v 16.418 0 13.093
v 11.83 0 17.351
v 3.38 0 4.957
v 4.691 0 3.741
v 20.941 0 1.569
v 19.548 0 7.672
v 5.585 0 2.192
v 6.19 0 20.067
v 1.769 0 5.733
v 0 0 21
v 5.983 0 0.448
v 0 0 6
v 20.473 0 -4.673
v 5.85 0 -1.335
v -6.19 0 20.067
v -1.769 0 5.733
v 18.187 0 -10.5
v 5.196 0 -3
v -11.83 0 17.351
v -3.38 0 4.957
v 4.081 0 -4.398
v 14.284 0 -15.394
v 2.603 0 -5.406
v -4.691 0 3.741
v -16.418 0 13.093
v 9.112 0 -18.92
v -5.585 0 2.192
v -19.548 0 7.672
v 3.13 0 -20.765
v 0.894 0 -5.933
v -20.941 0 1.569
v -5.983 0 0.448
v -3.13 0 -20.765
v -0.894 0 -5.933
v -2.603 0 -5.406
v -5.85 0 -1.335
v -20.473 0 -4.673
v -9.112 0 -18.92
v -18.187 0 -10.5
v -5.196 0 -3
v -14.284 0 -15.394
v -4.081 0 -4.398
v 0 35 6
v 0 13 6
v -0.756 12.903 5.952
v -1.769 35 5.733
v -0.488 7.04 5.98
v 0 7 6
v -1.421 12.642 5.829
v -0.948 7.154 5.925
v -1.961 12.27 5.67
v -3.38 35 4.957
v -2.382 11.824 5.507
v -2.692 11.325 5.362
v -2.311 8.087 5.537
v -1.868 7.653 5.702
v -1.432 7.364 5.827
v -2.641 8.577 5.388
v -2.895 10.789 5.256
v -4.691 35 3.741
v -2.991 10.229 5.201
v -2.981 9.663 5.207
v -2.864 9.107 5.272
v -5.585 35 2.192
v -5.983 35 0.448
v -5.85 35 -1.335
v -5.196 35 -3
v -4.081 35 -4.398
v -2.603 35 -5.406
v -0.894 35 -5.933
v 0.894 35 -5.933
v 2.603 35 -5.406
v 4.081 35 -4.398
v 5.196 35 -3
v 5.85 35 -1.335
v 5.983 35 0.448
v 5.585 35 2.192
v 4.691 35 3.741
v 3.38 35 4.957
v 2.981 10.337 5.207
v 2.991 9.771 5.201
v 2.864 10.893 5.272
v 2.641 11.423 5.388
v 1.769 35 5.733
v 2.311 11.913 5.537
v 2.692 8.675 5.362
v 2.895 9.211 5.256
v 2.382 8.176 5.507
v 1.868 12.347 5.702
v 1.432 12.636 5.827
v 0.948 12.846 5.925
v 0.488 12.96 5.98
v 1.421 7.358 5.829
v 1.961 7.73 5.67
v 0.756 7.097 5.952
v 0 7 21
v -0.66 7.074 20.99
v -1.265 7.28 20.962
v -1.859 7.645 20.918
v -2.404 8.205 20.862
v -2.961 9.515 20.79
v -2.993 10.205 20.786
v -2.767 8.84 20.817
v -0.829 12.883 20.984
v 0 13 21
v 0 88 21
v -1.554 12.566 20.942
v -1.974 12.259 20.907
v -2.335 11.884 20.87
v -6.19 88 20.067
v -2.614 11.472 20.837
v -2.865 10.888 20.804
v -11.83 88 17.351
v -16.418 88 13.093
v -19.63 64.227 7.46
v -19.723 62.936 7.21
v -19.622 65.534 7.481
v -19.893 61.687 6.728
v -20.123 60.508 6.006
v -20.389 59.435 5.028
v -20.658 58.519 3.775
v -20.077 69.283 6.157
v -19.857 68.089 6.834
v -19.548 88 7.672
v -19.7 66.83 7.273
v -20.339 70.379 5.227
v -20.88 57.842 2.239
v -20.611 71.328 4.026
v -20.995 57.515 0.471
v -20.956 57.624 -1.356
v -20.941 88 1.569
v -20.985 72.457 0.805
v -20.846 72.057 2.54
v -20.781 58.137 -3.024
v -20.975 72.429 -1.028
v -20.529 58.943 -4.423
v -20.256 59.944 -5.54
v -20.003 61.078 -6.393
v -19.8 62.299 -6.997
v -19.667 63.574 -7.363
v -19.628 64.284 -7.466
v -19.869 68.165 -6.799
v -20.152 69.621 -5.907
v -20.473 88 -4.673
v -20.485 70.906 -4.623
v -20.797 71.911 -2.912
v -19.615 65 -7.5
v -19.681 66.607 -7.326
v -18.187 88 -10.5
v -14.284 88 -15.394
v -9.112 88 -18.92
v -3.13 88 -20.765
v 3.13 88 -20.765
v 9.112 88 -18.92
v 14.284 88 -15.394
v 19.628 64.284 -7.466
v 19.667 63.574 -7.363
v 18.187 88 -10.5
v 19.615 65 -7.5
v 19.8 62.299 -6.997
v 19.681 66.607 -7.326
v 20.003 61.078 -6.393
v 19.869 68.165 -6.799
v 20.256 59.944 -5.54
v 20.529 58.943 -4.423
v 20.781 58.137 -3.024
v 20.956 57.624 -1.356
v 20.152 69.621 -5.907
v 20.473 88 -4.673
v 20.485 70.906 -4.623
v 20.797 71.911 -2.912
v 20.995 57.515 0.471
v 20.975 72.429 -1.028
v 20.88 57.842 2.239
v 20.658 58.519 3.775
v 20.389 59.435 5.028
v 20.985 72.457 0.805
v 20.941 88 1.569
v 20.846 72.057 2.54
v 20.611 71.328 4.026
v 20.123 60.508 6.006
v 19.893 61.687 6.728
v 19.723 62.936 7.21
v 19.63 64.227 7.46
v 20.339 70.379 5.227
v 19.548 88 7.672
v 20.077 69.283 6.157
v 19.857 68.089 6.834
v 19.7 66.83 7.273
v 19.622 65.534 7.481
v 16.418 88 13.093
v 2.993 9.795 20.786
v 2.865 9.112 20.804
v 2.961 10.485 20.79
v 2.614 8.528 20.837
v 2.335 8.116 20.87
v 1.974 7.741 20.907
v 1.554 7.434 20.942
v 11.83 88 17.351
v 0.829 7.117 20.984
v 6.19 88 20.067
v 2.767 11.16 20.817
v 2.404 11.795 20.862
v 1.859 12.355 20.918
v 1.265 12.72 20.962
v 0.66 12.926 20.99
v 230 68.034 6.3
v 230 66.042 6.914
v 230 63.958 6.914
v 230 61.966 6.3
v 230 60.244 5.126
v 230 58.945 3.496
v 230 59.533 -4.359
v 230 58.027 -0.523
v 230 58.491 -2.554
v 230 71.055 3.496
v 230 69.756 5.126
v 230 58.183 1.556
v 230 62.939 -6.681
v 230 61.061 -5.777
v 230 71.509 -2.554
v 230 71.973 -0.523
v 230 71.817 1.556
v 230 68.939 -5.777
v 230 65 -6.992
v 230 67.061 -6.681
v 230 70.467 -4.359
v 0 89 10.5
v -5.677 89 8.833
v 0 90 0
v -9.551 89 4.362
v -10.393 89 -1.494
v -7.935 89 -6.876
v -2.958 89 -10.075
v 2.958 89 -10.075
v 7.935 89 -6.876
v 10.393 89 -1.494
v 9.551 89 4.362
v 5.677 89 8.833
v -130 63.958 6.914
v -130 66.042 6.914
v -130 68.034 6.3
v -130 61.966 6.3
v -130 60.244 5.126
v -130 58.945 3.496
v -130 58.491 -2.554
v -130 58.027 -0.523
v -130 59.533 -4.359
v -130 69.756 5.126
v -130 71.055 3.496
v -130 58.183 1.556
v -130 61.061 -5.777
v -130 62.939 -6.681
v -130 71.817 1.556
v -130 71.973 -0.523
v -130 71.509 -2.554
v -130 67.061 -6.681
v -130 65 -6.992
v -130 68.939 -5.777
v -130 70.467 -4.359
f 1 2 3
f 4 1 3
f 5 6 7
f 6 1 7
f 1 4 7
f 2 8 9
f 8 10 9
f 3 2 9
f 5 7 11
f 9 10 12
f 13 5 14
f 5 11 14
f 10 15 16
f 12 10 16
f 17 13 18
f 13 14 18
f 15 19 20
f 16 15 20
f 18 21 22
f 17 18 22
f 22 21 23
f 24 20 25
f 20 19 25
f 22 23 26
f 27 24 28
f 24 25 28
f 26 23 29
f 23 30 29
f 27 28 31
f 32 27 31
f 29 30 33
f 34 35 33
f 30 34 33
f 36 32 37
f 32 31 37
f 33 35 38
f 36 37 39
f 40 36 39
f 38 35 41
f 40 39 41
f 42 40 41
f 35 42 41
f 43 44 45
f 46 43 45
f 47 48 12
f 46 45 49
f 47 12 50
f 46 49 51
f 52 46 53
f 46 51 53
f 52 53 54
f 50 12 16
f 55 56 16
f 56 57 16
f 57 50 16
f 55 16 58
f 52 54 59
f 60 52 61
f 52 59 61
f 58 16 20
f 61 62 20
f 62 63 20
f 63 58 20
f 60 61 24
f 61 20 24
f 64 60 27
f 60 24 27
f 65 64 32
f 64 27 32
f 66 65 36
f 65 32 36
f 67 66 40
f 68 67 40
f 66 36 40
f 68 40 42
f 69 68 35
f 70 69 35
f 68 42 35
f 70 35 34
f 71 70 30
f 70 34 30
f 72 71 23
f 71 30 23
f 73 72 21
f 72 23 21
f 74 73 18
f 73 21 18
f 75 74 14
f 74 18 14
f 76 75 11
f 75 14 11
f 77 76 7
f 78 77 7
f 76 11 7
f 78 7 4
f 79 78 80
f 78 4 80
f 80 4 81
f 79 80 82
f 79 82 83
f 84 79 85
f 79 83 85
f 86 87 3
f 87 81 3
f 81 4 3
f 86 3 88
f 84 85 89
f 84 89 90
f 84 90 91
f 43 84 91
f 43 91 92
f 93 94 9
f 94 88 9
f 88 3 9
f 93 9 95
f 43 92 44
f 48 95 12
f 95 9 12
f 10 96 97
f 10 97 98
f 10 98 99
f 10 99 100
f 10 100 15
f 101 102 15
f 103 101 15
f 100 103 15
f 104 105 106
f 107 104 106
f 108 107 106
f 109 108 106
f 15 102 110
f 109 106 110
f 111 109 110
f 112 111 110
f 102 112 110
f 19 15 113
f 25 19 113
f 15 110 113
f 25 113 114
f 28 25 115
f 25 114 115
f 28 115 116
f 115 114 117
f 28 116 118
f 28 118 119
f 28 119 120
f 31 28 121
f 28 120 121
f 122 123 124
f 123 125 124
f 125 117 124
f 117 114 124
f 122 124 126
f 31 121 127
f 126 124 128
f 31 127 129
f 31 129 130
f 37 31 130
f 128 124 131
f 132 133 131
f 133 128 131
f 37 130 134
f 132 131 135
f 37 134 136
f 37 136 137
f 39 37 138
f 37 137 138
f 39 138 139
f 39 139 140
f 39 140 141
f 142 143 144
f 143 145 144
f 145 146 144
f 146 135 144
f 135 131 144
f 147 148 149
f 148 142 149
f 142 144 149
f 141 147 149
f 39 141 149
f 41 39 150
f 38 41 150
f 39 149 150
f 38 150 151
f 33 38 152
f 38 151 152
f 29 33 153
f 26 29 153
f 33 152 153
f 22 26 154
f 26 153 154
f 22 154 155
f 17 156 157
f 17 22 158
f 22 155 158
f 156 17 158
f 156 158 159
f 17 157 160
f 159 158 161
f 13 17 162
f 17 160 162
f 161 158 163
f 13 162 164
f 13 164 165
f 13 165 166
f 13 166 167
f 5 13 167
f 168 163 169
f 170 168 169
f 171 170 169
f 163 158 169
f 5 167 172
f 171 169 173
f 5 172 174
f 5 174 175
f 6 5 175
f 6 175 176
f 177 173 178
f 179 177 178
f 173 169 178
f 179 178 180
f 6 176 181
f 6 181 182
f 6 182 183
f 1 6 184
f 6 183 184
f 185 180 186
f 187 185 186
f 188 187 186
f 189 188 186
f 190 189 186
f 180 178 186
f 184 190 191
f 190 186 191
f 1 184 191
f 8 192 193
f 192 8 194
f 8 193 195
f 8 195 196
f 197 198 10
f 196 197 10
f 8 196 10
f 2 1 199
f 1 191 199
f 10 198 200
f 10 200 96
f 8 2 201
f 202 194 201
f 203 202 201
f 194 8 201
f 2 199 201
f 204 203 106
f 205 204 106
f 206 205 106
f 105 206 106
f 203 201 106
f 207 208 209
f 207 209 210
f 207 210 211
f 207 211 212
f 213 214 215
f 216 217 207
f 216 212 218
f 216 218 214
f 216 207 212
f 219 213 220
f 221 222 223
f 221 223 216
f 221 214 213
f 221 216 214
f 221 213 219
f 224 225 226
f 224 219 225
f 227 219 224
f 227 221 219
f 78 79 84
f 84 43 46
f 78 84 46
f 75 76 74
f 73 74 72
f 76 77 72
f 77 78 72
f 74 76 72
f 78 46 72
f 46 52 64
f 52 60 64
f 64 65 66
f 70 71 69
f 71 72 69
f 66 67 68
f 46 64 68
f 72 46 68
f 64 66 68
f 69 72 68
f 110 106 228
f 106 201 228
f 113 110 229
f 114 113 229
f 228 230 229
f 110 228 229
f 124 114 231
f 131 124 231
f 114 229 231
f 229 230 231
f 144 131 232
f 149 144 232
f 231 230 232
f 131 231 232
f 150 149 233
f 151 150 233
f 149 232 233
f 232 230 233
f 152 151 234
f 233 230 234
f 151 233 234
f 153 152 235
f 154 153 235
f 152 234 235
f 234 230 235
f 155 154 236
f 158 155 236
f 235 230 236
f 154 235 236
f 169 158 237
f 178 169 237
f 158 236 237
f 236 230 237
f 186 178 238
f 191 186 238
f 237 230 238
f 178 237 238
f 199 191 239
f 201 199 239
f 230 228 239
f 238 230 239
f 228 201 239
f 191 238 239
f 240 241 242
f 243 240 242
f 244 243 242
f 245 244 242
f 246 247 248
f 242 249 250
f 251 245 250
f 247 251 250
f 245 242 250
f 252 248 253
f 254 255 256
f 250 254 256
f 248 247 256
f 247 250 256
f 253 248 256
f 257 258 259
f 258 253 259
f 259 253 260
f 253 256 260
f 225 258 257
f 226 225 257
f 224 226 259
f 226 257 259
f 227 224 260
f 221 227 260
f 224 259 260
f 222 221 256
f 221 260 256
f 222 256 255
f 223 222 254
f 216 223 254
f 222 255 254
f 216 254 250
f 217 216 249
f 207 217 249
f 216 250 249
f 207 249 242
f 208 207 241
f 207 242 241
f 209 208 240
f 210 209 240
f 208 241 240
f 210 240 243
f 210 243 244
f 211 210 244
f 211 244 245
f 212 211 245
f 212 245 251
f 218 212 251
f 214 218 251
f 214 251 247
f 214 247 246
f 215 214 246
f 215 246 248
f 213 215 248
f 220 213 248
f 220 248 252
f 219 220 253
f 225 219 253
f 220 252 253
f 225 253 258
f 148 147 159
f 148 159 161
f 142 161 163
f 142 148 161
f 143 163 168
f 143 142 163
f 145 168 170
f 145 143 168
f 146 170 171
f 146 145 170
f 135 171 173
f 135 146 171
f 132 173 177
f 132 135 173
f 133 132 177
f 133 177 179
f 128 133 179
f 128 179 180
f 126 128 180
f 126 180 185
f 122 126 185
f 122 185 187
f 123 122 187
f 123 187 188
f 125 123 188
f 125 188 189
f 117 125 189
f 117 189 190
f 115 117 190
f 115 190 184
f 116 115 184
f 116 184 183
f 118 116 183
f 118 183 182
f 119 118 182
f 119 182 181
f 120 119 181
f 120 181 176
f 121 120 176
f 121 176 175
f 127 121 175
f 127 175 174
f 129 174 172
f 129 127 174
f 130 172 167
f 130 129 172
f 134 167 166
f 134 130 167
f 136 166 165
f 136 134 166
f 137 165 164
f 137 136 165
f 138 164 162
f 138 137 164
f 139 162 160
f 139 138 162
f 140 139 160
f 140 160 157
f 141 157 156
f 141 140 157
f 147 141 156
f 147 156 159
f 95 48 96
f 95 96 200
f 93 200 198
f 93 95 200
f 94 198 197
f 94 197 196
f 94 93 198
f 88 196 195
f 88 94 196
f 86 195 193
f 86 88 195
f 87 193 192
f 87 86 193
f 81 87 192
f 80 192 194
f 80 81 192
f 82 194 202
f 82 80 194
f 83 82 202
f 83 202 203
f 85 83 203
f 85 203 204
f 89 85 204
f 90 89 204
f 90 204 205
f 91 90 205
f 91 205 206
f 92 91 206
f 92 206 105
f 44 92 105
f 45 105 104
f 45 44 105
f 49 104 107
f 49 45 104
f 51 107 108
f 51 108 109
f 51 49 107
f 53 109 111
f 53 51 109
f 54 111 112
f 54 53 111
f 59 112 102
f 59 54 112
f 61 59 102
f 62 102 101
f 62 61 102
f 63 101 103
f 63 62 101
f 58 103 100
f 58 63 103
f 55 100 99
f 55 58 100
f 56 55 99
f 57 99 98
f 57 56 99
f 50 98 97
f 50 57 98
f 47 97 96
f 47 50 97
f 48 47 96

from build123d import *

# Parameters (mm, degrees)
CUT_EXTRUDE2_DEPTH       = 95.773413994
CUT_EXTRUDE2_DEPTH_BACK  = 95.773413994
SKETCH3_R                = 7.5
BOSS_EXTRUDE1_DEPTH      = 230
BOSS_EXTRUDE1_DEPTH_BACK = 130
SKETCH5_R                = 6.992090562
SKETCH7_R                = 3
CUT_EXTRUDE3_DEPTH       = 248.872951336


with BuildPart() as part:
    # Sketch1 → Revolve1 (revolve)
    with BuildSketch(Plane.XY, mode=Mode.PRIVATE) as revolve1_sk:
        Polygon((-6, 0), (-21, 0), (-21, 88), (0, 90), (0, 35), (-6, 35), align=None)
    revolve(revolve1_sk.sketch.rotate(Axis((0, 19.249426994, 0), (0, -1, 0)), 270), axis=Axis((0, 19.249426994, 0), (0, -1, 0)))

    # Sketch3 → Cut-Extrude2 (cut, two sides: drawn at the far end of the back side and taken through both)
    with BuildSketch(Plane(origin=(0, 0, 0), x_dir=(0, 0, -1), z_dir=(1, 0, 0)).offset(-CUT_EXTRUDE2_DEPTH_BACK)):
        with Locations((0, 65)):
            Circle(SKETCH3_R)
    extrude(amount=CUT_EXTRUDE2_DEPTH + CUT_EXTRUDE2_DEPTH_BACK, mode=Mode.SUBTRACT)

    # Sketch7 → Cut-Extrude3 (cut, through all)
    with BuildSketch(Plane.XY):
        with Locations(Location((0, 10, 0), (0, 0, 270))):
            Circle(SKETCH7_R)
    extrude(amount=CUT_EXTRUDE3_DEPTH, mode=Mode.SUBTRACT)


with BuildPart() as body_2:
    # Sketch5 → Boss-Extrude1 (new, two sides: drawn at the far end of the back side and taken through both)
    with BuildSketch(Plane(origin=(0, 0, 0), x_dir=(0, 0, -1), z_dir=(1, 0, 0)).offset(-BOSS_EXTRUDE1_DEPTH_BACK)):
        with Locations((0, 65)):
            Circle(SKETCH5_R)
    extrude(amount=BOSS_EXTRUDE1_DEPTH + BOSS_EXTRUDE1_DEPTH_BACK)


solid = Compound([part.part, body_2.part])
